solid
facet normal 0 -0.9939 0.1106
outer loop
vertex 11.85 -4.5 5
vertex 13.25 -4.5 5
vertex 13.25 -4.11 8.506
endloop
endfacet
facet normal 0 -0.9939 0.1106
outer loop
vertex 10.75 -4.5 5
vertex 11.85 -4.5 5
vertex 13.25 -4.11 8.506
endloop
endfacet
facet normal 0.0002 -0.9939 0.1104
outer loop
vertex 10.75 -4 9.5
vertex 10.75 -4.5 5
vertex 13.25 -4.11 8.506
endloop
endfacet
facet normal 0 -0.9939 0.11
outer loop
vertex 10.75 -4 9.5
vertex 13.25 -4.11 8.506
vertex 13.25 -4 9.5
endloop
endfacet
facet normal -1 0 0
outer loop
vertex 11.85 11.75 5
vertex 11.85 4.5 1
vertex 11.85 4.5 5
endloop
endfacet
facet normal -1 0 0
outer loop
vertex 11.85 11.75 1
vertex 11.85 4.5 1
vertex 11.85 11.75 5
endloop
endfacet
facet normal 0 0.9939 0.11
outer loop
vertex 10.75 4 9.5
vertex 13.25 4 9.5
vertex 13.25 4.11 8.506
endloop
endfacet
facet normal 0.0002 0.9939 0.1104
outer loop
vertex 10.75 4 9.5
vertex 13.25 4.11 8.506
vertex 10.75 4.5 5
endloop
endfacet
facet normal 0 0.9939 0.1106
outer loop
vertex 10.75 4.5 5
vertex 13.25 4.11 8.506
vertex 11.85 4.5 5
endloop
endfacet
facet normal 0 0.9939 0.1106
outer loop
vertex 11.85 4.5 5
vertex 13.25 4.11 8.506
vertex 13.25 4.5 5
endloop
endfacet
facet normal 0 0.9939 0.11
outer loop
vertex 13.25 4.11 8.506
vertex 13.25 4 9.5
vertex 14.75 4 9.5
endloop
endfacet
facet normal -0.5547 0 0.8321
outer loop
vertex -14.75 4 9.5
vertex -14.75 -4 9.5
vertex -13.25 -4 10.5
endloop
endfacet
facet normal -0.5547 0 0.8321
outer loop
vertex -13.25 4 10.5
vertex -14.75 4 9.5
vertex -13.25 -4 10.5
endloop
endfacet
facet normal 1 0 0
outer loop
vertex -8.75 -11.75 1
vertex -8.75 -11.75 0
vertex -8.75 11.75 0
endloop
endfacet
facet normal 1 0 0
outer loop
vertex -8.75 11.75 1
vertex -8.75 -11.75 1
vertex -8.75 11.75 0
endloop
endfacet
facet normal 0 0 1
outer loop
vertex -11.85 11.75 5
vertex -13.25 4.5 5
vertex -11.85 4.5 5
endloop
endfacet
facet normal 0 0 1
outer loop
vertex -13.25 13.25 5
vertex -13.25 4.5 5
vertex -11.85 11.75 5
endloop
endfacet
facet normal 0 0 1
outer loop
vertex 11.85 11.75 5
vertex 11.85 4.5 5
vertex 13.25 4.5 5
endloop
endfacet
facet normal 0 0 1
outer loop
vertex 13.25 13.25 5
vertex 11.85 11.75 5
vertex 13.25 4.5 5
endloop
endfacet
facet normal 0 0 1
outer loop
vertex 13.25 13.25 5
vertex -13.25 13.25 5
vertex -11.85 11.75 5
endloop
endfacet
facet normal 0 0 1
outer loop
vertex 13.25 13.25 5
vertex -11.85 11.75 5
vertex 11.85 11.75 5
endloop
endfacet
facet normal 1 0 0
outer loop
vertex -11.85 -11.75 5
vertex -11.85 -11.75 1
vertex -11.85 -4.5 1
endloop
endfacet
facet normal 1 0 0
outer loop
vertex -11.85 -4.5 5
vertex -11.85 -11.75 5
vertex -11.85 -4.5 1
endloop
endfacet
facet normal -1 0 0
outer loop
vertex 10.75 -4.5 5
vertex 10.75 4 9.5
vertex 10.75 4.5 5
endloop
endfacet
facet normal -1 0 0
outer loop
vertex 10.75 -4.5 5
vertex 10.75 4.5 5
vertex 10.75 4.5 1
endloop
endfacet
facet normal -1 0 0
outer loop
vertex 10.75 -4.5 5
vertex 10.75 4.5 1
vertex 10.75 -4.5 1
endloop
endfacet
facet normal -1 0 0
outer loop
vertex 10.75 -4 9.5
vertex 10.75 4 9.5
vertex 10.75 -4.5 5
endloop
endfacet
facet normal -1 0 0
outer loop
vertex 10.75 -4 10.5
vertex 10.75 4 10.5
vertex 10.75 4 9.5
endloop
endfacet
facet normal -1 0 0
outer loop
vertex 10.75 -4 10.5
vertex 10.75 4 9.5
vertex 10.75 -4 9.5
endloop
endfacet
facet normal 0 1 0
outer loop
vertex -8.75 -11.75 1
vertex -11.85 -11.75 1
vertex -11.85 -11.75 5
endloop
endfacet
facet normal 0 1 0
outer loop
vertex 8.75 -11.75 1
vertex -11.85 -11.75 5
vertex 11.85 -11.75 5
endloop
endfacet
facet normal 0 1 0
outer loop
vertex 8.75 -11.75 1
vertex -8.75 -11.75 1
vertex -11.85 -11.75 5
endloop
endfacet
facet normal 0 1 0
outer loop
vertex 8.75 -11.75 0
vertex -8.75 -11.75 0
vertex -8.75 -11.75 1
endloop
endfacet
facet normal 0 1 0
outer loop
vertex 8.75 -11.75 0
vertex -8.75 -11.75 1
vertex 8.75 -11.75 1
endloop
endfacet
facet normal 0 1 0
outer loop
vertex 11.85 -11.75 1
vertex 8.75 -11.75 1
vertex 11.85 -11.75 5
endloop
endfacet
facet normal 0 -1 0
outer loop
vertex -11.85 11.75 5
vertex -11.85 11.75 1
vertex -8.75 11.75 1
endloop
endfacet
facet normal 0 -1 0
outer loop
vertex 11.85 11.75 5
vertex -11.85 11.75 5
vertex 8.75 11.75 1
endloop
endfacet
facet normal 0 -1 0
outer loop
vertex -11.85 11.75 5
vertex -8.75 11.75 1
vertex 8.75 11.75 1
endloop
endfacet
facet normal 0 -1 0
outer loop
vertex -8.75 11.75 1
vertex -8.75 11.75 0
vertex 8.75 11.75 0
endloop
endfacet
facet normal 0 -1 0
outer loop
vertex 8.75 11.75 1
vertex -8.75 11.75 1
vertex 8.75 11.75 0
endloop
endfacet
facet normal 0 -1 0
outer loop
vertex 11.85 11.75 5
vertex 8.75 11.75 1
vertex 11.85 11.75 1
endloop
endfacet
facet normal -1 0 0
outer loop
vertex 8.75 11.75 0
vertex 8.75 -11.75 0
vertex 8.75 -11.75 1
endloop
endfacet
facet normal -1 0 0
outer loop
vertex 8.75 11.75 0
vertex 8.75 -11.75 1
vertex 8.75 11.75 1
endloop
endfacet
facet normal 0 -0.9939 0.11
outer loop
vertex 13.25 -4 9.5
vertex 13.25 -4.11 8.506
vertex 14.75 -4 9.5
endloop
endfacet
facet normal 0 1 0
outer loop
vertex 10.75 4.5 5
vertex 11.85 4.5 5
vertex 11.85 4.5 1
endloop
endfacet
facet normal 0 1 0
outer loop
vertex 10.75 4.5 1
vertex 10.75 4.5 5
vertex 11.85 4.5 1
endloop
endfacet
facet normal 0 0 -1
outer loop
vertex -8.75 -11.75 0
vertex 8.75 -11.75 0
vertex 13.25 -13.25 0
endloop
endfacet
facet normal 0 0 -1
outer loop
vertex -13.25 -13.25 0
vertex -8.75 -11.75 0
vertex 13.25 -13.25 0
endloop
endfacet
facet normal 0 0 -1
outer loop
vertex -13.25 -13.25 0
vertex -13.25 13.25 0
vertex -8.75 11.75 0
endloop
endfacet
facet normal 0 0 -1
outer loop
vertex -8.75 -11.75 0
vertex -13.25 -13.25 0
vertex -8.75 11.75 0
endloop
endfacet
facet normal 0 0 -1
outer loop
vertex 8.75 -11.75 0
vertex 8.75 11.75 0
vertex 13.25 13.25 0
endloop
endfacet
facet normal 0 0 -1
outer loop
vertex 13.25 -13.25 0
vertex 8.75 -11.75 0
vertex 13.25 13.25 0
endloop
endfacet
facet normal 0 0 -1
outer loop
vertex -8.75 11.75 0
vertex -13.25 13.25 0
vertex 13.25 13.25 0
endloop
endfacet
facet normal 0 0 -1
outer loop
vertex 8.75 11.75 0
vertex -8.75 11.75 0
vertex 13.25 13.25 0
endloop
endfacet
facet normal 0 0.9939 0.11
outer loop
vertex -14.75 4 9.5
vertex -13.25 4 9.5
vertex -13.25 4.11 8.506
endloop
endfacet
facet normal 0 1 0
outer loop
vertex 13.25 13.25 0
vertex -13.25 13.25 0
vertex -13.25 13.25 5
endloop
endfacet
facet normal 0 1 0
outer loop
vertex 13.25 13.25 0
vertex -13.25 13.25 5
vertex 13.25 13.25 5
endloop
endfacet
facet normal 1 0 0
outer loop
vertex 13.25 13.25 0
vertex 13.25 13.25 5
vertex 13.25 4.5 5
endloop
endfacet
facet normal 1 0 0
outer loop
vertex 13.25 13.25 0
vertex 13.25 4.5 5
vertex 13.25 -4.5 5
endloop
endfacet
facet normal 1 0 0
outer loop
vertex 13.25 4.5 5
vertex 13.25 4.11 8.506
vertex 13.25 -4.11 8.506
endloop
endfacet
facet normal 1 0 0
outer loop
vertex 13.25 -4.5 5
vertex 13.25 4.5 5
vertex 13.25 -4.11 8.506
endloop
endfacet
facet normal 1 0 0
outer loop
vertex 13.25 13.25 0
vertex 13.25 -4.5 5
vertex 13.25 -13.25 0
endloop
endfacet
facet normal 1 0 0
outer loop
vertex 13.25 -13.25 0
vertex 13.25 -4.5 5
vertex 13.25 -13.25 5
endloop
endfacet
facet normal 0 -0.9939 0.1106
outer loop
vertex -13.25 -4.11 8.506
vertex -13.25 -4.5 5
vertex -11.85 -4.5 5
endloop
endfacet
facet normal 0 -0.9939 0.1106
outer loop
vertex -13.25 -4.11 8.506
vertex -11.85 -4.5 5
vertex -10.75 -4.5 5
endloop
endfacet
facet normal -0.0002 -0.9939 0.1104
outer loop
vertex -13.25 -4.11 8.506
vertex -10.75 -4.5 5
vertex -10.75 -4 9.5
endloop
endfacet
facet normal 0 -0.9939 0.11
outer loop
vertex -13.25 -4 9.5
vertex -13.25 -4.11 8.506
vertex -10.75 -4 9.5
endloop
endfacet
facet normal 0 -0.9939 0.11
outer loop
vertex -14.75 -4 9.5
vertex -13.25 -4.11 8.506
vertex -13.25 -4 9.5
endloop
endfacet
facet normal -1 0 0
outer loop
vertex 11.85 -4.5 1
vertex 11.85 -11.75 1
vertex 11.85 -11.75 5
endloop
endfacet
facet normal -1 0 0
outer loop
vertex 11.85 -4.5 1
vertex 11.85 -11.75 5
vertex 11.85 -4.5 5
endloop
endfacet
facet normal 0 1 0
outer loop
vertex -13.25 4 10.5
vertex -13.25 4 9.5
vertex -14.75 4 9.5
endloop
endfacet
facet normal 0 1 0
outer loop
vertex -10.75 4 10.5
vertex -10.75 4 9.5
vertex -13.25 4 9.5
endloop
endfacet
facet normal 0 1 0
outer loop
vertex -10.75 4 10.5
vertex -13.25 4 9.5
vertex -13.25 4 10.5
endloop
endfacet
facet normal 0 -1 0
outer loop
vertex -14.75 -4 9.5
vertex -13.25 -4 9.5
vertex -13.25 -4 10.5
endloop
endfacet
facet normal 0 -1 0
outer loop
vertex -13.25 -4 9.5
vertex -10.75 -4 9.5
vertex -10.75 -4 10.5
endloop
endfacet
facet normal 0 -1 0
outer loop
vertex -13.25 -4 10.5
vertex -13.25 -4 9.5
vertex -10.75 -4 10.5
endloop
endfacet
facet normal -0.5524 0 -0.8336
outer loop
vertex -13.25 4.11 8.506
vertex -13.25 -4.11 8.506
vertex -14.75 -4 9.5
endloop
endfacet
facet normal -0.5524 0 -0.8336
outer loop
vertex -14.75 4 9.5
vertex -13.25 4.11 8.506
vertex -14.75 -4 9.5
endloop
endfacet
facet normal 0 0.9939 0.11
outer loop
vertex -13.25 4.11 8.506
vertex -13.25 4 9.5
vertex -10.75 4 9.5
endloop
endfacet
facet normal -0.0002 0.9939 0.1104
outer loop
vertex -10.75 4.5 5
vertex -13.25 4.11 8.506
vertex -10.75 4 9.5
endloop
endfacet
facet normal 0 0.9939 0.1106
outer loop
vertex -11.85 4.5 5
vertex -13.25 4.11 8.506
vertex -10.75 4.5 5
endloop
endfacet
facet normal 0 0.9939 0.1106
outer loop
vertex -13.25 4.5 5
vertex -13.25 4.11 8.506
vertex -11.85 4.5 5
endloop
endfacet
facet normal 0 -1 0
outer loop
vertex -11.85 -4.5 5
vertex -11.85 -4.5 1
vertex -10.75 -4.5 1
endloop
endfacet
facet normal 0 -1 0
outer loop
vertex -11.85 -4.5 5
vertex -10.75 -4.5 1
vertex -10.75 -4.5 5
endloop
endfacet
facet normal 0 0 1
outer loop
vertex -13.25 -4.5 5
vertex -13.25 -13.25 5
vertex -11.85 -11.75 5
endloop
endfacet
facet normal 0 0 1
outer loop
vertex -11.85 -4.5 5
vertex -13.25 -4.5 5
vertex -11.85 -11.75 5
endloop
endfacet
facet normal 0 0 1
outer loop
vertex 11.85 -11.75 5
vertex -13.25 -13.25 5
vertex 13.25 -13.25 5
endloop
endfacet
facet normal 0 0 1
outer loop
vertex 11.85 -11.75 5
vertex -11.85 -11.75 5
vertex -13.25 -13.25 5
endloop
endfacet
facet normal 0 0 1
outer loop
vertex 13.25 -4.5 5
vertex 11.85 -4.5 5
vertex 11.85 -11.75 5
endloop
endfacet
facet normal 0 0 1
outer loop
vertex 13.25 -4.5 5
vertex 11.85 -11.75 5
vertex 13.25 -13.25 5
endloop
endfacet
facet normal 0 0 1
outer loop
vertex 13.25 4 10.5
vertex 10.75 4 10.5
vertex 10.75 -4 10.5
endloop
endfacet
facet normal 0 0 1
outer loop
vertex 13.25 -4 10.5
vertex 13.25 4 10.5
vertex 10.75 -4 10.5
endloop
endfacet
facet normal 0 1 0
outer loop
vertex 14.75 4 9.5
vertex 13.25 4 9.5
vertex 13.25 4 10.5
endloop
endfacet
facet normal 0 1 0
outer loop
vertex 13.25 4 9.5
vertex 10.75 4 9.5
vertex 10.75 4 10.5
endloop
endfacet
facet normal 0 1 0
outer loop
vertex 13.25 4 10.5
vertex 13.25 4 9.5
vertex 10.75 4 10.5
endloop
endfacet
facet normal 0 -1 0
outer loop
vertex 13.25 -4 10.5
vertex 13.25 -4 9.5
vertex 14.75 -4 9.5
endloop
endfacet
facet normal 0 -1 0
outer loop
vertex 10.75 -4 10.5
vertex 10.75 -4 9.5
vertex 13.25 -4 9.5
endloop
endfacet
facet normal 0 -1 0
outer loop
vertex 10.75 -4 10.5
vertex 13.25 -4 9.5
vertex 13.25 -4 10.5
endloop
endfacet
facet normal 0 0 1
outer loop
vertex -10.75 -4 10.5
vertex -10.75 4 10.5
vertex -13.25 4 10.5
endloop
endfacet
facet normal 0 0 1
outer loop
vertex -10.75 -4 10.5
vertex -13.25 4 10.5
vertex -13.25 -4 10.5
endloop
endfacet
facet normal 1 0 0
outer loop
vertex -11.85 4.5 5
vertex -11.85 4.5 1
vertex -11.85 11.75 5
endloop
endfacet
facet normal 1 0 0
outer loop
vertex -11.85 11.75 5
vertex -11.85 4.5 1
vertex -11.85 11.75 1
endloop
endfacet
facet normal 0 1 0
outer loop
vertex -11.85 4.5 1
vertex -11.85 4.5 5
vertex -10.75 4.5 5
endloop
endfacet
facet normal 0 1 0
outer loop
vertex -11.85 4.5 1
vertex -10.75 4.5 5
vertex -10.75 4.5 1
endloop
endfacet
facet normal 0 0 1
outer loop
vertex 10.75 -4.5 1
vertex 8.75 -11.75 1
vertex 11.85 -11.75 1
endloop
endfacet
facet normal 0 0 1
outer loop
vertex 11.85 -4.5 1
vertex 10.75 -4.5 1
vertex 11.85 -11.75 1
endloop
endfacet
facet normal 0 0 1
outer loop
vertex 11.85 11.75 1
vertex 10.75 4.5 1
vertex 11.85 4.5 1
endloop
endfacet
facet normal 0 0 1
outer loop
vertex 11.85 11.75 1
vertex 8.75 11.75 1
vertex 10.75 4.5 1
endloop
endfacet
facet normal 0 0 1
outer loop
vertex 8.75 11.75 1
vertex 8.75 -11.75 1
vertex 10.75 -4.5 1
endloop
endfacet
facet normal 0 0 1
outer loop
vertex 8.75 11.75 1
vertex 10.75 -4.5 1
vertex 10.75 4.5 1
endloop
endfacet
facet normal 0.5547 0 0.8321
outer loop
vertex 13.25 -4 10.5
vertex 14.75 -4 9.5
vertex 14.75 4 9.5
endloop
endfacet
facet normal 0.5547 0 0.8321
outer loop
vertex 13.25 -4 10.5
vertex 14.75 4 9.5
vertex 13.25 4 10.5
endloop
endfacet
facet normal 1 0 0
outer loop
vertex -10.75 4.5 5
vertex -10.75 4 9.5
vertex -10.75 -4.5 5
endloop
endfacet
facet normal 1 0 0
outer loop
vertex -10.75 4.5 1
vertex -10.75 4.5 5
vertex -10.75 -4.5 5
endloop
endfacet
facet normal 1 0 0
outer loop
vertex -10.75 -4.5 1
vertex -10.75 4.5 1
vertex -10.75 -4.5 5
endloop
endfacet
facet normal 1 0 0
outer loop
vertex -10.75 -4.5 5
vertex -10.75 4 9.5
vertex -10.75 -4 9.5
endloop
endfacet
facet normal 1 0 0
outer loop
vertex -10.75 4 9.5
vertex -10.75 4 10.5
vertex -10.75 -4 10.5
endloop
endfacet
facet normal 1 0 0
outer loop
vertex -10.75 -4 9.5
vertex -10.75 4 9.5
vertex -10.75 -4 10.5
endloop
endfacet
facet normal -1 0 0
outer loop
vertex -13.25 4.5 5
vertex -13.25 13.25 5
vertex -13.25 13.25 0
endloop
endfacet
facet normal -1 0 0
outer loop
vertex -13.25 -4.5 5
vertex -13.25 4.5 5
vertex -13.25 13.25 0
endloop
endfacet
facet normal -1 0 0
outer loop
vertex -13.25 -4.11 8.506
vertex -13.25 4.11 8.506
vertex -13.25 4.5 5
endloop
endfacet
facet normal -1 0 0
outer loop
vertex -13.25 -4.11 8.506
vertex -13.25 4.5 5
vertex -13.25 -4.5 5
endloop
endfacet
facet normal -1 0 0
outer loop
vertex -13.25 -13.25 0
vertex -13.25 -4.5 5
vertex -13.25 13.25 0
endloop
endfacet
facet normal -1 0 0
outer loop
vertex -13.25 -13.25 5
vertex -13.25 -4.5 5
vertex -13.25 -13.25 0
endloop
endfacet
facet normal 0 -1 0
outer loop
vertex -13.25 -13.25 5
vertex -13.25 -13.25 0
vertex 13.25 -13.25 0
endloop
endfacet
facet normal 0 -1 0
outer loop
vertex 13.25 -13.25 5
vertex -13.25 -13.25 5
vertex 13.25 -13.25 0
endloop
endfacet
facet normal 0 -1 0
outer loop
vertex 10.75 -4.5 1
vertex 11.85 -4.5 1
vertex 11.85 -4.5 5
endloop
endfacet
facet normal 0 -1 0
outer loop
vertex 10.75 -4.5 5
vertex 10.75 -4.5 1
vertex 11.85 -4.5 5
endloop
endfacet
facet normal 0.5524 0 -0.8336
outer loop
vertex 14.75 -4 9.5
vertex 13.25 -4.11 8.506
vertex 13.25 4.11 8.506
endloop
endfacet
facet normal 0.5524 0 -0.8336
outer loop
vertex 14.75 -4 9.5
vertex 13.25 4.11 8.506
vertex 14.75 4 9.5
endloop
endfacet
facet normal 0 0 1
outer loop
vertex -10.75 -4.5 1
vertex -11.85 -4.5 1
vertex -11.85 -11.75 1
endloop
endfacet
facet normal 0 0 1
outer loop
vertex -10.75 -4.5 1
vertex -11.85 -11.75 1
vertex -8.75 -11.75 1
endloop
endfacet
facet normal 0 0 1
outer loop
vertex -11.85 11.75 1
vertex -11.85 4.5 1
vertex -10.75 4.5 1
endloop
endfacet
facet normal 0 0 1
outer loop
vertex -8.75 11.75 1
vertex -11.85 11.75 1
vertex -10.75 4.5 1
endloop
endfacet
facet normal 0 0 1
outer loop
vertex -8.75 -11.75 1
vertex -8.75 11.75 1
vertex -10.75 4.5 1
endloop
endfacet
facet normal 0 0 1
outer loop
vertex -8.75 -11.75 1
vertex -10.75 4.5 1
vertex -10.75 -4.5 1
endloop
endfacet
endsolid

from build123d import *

# Parameters (mm, degrees)
F0_W          = 26.5
F0_H          = 26.5
F0_W_2        = 23.7
F0_H_2        = 23.5
F1_DEPTH      = 5
F2_W          = 26.5
F2_H          = 26.5
F2_W_2        = 17.5
F2_H_2        = 23.5
F3_DEPTH      = 1
F5_DEPTH      = 2.5
F6_W          = 8
F6_H          = 1
F7_DEPTH      = 1.5
F9_DEPTH      = 25
F9_DEPTH_BACK = 25


with BuildPart() as f1:
    # F0 (on Top) → F1 (new body)
    with BuildSketch(Plane.XY):
        Rectangle(F0_W, F0_H)
        Rectangle(F0_W_2, F0_H_2, mode=Mode.SUBTRACT)
    extrude(amount=F1_DEPTH)

    # F2 (on Top) → F3 (join)
    with BuildSketch(Plane.XY):
        Rectangle(F2_W, F2_H)
        Rectangle(F2_W_2, F2_H_2, mode=Mode.SUBTRACT)
    extrude(amount=F3_DEPTH)

    # F4 (on face) → F5 (join)
    with BuildSketch(Plane(origin=(-13.25, 0, 0), x_dir=(0, -1, 0), z_dir=(-1, 0, 0))):
        Polygon((4.5, 5), (0, 5), (-4.5, 5), (-4.5, 0), (4.5, 0), align=None)
        Polygon((-4.5, 5), (0, 5), (0, 9.5), (-4, 9.5), align=None)
        Polygon((0, 9.5), (0, 5), (4.5, 5), (4, 9.5), align=None)
        Polygon((-4, 9.5), (0, 9.5), (4, 9.5), (4, 10.5), (-4, 10.5), align=None)
    extrude(amount=-F5_DEPTH)

    # F6 (on face) → F7 (join)
    with BuildSketch(Plane(origin=(-13.25, 0, 0), x_dir=(0, -1, 0), z_dir=(-1, 0, 0))):
        Polygon((-4, 9.5), (-4.110432, 8.506116), (4.110432, 8.506116), (4, 9.5), align=None)
        with Locations((0, 10)):
            Rectangle(F6_W, F6_H)
    extrude(amount=F7_DEPTH)

    # F8 (on Front) → F9 (cut, two sides)
    with BuildSketch(Plane.XZ) as f9_sk:
        Polygon((-14.75, 8.506116), (-13.25, 8.506116), (-14.75, 9.5), align=None)
        Polygon((-14.75, 10.5), (-14.75, 9.5), (-13.25, 10.5), align=None)
    extrude(amount=F9_DEPTH, mode=Mode.SUBTRACT)
    extrude(f9_sk.sketch, amount=-F9_DEPTH_BACK, mode=Mode.SUBTRACT)

    # F10: F1 across plane


with BuildPart() as f1_1:
    add(f1.part)
    add(f1.part.mirror(Plane.YZ))


solid = f1_1.part
